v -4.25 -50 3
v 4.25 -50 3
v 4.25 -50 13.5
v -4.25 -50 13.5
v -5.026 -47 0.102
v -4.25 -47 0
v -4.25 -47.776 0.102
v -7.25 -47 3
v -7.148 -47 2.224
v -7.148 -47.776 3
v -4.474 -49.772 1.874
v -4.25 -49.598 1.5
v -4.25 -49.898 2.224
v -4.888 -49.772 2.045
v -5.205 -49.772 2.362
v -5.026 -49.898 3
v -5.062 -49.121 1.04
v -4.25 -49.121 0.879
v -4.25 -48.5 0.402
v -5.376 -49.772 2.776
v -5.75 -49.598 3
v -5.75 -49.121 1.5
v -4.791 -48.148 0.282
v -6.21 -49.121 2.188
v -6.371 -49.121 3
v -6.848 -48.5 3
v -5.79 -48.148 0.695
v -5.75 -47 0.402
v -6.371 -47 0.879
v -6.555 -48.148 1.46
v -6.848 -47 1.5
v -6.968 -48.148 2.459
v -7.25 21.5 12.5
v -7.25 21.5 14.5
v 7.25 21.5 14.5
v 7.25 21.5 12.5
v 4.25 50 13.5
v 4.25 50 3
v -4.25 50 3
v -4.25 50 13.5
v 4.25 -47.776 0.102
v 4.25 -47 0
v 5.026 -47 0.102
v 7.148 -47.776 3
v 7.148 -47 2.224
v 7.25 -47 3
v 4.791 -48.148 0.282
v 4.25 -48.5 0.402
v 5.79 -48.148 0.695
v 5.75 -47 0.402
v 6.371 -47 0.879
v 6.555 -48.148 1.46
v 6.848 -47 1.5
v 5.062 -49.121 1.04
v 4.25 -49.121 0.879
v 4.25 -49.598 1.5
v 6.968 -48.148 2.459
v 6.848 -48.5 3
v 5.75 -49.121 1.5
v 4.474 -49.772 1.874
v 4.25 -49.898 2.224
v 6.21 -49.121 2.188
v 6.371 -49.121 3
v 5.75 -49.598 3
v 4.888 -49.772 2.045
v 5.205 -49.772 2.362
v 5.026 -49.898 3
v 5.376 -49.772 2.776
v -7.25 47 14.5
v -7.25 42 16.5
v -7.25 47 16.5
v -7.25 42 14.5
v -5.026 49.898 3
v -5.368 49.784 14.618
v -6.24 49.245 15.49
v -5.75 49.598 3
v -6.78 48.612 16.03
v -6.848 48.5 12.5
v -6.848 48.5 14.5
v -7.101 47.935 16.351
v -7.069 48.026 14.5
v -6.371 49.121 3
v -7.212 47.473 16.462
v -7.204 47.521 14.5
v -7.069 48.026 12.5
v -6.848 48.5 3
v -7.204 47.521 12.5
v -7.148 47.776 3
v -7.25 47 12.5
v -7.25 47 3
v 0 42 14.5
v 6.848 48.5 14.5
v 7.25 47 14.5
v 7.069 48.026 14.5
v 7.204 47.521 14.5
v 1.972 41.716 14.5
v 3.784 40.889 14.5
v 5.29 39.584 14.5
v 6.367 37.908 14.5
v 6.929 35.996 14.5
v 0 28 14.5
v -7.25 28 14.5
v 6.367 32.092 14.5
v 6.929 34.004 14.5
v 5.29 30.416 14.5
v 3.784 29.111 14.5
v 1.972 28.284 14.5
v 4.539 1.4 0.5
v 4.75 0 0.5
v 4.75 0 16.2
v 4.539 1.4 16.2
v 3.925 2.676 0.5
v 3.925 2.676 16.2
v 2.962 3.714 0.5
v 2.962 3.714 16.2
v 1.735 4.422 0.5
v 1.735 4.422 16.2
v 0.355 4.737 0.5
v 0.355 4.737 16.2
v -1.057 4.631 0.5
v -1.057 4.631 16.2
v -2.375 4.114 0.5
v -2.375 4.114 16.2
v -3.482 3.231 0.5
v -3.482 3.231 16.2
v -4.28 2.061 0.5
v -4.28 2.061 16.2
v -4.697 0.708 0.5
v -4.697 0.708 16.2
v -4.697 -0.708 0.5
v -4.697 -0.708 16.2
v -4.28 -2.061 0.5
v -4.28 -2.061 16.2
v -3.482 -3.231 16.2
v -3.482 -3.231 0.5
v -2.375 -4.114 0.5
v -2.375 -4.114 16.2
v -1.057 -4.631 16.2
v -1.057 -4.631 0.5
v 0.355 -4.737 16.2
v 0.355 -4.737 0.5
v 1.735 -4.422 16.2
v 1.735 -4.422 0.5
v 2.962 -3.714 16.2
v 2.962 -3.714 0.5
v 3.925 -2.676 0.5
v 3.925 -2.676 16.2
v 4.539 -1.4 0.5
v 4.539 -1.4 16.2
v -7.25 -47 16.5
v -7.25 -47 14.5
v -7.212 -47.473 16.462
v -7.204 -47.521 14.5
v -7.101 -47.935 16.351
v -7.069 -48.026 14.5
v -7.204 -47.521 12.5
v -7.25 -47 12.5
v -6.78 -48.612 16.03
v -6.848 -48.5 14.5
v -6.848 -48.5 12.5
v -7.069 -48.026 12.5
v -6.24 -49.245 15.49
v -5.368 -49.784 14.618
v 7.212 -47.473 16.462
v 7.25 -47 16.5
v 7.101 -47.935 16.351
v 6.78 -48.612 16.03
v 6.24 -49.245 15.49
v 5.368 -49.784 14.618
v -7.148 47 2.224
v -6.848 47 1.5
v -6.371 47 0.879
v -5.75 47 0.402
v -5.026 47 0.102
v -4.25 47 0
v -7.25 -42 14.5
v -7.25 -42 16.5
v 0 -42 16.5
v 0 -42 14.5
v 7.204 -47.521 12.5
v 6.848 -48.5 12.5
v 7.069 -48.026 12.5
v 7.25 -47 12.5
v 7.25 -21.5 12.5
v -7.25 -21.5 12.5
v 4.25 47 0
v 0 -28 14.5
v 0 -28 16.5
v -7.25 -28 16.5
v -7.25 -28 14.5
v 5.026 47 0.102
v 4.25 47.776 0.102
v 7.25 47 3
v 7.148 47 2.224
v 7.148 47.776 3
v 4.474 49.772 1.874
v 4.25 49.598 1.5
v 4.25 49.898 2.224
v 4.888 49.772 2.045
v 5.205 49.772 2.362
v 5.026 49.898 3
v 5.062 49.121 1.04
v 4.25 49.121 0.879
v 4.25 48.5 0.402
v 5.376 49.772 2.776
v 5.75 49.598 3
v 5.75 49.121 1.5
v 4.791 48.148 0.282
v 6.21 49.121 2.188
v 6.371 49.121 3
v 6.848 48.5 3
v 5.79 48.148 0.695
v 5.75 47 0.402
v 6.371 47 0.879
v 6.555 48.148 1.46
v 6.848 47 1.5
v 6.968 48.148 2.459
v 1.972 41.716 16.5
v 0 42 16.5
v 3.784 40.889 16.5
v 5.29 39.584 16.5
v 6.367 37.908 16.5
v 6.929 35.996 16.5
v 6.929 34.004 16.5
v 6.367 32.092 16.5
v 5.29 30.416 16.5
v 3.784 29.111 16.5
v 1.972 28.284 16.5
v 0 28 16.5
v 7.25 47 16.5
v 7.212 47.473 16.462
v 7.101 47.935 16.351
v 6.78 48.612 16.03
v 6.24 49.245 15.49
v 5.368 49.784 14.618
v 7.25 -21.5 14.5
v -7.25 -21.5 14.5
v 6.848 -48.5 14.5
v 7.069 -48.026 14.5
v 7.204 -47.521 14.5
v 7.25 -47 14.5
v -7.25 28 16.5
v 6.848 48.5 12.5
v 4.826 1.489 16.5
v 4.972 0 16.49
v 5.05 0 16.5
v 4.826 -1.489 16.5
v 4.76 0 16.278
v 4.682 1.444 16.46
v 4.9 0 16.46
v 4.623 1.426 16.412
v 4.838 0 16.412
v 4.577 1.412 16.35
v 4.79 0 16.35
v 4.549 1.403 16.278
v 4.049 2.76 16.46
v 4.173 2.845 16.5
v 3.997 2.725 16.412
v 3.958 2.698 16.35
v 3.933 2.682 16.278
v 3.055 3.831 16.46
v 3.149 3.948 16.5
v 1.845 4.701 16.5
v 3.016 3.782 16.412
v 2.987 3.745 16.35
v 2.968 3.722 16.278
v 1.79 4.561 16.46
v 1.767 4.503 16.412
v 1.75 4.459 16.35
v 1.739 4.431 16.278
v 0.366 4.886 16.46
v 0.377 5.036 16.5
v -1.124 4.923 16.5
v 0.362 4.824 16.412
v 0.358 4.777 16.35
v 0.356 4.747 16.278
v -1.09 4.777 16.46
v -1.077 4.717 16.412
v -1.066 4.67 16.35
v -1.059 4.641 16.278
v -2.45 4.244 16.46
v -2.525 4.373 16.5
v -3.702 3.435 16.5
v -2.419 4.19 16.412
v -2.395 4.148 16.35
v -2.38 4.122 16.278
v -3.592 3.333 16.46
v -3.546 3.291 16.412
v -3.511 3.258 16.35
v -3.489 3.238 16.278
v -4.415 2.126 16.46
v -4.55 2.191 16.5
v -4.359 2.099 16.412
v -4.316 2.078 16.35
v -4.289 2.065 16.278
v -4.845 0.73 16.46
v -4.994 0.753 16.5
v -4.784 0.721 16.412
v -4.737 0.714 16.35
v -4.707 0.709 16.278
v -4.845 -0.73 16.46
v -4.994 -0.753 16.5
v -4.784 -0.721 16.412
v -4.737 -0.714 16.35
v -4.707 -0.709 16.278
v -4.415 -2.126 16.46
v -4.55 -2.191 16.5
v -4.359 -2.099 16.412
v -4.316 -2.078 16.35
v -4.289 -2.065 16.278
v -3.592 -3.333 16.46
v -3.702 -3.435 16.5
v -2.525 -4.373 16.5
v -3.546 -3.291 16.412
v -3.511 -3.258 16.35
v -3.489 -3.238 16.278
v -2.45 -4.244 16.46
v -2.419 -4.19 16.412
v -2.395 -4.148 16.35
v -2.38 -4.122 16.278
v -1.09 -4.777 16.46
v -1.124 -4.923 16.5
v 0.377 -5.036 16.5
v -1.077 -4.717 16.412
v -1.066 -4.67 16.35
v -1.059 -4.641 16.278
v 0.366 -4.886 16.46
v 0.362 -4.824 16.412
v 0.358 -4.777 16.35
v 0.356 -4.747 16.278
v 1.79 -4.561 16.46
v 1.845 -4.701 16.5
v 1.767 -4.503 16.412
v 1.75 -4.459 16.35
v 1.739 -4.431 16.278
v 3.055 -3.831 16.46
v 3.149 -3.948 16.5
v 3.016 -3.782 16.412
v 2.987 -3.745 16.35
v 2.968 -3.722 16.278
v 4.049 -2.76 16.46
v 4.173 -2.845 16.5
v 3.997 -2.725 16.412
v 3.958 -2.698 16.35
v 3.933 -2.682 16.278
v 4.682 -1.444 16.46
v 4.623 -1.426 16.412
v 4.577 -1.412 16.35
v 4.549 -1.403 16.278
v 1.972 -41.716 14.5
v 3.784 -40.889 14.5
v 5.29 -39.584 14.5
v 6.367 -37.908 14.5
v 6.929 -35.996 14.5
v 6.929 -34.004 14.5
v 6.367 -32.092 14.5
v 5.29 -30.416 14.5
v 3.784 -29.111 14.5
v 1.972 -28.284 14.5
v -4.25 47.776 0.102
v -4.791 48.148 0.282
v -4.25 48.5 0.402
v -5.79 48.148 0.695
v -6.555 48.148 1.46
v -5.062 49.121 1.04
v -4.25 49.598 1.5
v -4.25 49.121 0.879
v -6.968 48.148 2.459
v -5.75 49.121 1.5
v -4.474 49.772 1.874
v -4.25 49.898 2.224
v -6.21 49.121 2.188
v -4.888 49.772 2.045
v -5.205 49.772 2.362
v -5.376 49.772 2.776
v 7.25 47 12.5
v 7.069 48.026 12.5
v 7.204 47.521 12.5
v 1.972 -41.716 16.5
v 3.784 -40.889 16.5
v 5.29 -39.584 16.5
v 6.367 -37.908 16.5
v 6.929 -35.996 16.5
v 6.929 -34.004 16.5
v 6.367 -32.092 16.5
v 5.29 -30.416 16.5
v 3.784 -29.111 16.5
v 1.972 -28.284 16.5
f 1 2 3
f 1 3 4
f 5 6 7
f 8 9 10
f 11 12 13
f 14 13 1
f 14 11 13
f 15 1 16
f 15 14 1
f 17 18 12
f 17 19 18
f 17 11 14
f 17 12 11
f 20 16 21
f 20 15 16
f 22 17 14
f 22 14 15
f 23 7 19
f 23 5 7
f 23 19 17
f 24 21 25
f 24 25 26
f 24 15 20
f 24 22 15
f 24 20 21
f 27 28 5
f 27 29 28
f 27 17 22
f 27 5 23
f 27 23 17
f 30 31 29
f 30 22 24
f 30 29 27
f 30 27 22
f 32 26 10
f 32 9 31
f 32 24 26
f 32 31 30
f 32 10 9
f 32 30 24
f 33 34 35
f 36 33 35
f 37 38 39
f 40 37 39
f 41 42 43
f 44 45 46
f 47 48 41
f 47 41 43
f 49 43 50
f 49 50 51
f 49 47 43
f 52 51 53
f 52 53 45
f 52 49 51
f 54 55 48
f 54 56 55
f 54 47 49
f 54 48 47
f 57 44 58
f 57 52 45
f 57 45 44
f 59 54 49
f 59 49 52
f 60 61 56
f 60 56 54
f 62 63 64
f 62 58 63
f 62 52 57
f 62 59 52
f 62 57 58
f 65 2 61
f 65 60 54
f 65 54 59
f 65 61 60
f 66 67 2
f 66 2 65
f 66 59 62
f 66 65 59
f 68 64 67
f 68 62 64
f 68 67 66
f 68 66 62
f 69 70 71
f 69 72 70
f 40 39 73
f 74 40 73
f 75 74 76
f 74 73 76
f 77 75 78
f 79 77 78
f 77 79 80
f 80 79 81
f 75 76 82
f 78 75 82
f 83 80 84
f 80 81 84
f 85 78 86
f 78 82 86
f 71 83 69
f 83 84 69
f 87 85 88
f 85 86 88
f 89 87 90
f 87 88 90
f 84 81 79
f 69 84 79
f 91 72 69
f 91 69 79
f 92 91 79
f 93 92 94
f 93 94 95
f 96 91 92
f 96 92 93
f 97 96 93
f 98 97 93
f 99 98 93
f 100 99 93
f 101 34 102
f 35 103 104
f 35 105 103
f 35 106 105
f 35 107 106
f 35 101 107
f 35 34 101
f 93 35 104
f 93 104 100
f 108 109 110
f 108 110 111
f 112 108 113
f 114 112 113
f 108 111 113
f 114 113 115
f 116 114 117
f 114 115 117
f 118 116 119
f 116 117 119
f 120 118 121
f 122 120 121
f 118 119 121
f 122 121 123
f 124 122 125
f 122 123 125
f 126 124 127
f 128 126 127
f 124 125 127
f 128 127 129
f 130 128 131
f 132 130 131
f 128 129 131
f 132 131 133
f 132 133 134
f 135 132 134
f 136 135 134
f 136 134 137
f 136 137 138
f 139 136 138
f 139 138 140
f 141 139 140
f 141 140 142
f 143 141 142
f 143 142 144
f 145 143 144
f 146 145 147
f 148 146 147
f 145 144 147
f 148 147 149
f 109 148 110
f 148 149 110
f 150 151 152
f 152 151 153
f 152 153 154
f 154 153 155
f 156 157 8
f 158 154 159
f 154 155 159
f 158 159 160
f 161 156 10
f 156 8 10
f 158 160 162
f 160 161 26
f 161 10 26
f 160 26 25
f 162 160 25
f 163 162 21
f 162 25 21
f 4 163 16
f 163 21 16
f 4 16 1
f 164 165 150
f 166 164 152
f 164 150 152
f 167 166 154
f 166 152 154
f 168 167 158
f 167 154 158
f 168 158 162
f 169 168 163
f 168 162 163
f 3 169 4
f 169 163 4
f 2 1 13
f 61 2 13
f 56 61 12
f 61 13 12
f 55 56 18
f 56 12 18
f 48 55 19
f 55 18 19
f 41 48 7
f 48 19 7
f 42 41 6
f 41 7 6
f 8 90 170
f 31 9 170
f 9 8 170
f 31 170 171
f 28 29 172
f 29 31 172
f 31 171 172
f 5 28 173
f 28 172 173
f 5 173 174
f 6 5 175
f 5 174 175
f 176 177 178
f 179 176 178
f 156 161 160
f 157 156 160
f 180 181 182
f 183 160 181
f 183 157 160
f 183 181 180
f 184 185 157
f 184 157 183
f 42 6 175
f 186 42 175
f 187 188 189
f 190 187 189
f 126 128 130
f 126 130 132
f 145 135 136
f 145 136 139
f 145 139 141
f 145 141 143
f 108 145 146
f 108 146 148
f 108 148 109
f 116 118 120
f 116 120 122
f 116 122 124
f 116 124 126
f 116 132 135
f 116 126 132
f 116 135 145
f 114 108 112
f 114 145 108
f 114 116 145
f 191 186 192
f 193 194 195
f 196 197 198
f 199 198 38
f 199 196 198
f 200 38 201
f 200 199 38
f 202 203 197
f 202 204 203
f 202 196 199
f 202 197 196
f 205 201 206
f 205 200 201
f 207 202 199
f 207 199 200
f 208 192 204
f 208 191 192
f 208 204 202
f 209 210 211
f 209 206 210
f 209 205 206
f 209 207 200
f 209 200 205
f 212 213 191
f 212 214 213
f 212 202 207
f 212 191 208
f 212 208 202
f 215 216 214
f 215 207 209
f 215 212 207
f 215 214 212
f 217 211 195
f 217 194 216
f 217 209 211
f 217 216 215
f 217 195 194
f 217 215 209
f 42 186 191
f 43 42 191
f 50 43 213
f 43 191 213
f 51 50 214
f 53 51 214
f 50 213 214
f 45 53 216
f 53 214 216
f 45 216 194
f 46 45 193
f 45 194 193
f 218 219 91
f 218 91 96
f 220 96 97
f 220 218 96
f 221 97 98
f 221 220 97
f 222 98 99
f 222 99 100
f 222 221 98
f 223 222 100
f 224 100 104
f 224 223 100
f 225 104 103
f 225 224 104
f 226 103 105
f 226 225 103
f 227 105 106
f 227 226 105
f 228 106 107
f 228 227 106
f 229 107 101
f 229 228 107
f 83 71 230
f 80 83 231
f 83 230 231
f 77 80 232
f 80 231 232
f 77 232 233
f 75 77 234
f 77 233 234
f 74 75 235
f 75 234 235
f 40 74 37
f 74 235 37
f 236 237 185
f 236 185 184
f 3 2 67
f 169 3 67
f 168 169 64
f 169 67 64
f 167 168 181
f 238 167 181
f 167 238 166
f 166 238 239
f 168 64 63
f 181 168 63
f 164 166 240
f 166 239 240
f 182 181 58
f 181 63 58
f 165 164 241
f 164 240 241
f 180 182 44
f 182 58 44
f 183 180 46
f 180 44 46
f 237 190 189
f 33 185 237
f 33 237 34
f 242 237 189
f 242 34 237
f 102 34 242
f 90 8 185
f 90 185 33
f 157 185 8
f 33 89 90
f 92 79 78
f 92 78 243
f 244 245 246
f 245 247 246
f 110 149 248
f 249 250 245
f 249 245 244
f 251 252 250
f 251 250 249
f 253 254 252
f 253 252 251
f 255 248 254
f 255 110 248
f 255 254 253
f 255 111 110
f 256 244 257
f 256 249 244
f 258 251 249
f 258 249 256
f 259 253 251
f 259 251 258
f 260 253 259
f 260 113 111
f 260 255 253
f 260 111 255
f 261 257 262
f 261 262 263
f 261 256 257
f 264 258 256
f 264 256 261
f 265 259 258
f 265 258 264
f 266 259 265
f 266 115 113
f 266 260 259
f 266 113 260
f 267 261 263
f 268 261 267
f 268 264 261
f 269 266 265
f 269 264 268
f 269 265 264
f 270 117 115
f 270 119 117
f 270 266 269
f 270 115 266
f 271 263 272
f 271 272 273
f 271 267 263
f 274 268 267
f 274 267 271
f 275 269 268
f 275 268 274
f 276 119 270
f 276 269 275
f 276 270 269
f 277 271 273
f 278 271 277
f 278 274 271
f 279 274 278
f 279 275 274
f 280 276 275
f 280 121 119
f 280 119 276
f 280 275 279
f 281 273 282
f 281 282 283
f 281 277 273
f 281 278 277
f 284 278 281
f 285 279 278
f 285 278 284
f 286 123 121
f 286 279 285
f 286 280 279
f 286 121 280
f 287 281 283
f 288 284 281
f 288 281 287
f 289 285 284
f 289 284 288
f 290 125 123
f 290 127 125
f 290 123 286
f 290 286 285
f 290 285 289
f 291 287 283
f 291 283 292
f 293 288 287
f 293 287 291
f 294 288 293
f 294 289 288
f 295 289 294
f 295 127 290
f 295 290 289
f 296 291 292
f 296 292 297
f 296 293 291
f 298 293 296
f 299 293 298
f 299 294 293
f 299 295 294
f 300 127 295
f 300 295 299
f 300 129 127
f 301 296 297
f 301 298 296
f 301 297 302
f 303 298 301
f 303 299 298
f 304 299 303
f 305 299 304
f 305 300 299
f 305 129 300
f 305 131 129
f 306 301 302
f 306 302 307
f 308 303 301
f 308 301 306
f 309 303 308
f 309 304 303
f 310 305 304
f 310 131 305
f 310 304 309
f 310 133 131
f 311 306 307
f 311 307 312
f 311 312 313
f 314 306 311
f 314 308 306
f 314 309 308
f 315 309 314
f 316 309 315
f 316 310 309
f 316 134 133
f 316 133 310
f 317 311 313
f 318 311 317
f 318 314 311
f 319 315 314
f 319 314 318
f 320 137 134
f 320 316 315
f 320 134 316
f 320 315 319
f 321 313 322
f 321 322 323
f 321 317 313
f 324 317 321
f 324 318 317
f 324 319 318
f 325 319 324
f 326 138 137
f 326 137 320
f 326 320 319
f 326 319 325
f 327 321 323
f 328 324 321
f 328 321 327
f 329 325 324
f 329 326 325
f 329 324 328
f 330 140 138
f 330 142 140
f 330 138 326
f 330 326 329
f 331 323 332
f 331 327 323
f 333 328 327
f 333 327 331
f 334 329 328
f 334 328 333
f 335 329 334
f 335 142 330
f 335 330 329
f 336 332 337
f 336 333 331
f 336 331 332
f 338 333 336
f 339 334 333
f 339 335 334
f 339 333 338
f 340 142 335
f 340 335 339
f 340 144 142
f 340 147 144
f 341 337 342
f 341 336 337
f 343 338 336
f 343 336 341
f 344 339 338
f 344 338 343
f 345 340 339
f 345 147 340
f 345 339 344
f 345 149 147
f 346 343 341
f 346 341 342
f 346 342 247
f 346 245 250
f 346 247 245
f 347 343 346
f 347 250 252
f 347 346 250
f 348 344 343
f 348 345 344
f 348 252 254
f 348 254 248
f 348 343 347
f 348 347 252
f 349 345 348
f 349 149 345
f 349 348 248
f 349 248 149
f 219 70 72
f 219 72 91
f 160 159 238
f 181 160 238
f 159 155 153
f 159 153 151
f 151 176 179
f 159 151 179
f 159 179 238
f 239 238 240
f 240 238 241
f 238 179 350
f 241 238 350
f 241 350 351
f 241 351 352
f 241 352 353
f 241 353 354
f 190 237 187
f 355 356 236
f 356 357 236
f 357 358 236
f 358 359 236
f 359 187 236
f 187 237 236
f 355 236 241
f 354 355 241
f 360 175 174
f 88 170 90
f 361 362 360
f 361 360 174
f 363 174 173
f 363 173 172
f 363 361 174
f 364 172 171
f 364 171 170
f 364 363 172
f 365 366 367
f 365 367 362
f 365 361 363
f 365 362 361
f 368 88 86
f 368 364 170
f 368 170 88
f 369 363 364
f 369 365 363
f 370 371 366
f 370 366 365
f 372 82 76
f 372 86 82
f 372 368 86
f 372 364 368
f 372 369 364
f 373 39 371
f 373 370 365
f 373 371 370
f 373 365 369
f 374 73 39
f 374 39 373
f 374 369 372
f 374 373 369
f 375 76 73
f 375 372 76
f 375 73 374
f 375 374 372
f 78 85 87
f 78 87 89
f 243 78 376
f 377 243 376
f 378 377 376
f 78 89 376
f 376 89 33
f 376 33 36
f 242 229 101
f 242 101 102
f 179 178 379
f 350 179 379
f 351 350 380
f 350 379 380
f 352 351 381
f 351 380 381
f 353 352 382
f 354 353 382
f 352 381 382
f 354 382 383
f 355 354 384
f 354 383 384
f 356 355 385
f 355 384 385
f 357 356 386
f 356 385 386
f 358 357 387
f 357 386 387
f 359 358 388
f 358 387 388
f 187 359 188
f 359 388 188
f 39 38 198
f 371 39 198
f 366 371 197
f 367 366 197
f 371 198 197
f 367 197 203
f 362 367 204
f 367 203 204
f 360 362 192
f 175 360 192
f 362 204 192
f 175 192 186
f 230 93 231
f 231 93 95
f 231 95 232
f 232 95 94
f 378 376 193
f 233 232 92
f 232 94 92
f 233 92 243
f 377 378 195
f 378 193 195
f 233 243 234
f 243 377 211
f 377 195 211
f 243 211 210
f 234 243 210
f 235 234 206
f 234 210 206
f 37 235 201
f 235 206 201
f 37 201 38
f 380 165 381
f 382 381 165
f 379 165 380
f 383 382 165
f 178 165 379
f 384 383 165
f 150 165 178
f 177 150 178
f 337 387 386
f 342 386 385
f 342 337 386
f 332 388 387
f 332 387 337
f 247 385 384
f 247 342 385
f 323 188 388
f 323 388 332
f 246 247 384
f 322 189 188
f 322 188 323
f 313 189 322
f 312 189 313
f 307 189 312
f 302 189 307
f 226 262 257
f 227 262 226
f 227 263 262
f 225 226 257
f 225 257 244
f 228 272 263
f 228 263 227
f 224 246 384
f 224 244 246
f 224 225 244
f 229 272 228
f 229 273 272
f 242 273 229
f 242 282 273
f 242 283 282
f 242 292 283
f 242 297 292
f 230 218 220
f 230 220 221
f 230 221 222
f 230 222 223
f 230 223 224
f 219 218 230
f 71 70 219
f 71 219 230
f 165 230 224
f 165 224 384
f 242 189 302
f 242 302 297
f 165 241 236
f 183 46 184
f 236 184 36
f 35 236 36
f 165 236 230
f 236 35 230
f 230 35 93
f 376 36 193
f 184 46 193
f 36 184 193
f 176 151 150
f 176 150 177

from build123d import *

# Parameters (mm, degrees)
SKETCH7_W           = 100
SKETCH7_H           = 14.5
BOSS_EXTRUDE1_DEPTH = 16.5
SKETCH8_R           = 4.75
CUT_EXTRUDE2_DEPTH  = 16
CUT_EXTRUDE3_START  = -2
SKETCH9_W           = 27
SKETCH9_H           = 27
CUT_EXTRUDE3_DEPTH  = 2
CUT_EXTRUDE4_DEPTH  = 2
FILLET1_R           = 3
FILLET2_R           = 3
FILLET3_R           = 0.3
FILLET4_R           = 3


with BuildPart() as part:
    # Sketch7 → Boss-Extrude1 (new body)
    with BuildSketch(Plane(origin=(0, 0, 0), x_dir=(0, 1, 0), z_dir=(0, 0, 1))):
        Rectangle(SKETCH7_W, SKETCH7_H)
    extrude(amount=BOSS_EXTRUDE1_DEPTH)

    # Sketch8 → Cut-Extrude2 (cut)
    with BuildSketch(Plane(origin=(0, 0, 16.5), x_dir=(0, -1, 0), z_dir=(0, 0, 1))):
        with Locations(Location((0, 0, 0), (0, 0, 90))):
            Circle(SKETCH8_R)
    extrude(amount=-CUT_EXTRUDE2_DEPTH, mode=Mode.SUBTRACT)

    # Sketch9 → Cut-Extrude3 (cut)
    with BuildSketch(Plane.XY.offset(16.5).offset(CUT_EXTRUDE3_START)):
        with Locations((0, -35)):
            Rectangle(SKETCH9_W, SKETCH9_H)
    cut_extrude3 = extrude(amount=-CUT_EXTRUDE3_DEPTH, mode=Mode.SUBTRACT)

    # Sketch10 → Cut-Extrude4 (cut)
    with BuildSketch(Plane.XY.offset(16.5)):
        with BuildLine():
            Line((0, -28), (-7.25, -28))
            Line((-7.25, -28), (-7.25, -42))
            Line((-7.25, -42), (0, -42))
            ThreePointArc((0, -42), (7, -35), (0, -28))
        make_face()
    cut_extrude4 = extrude(amount=-CUT_EXTRUDE4_DEPTH, mode=Mode.SUBTRACT)

    # Mirror1: Cut-Extrude3 across plane
    add(cut_extrude3.mirror(Plane.ZX), mode=Mode.SUBTRACT)

    # Mirror2: Cut-Extrude4 across plane
    add(cut_extrude4.mirror(Plane.ZX), mode=Mode.SUBTRACT)

    # Fillet1
    fillet1_edges = [part.edges().sort_by_distance(p)[0] for p in [
        (-7.25, 0, 0),
    ]]
    fillet(fillet1_edges, radius=FILLET1_R)

    # Fillet2
    fillet2_edges = [part.edges().sort_by_distance(p)[0] for p in [
        (7.25, 0, 0),
    ]]
    fillet(fillet2_edges, radius=FILLET2_R)

    # Fillet3
    fillet3_edges = [part.edges().sort_by_distance(p)[0] for p in [
        (-4.75, 0, 16.5),
    ]]
    fillet(fillet3_edges, radius=FILLET3_R)

    # Fillet4
    # the kernel refuses this fillet: 3 mm, written as the material it takes off along each edge
    with BuildSketch(Plane(origin=(-4.25, -50, 3), x_dir=(0, 0, -1), z_dir=(1, 0, 0))) as fillet4_piece_1:
        with BuildLine():
            CenterArc((3 - FILLET4_R, FILLET4_R), FILLET4_R, 270, 90)
            Line((3, FILLET4_R), (3, 0))
            Line((3, 0), (3 - FILLET4_R, 0))
        make_face()
    revolve(axis=Axis((-4.25, -50, 3), (0, 1, 0)), revolution_arc=90, mode=Mode.SUBTRACT)
    with BuildSketch(Plane(origin=(-7.25, -50, 3), x_dir=(0, 1, 0), z_dir=(0, 0, 1))) as fillet4_piece_2:
        with BuildLine():
            CenterArc((FILLET4_R, -FILLET4_R), FILLET4_R, 90, 90)
            Line((0, -FILLET4_R), (0, 0))
            Line((0, 0), (FILLET4_R, 0))
        make_face()
    extrude(amount=21, mode=Mode.SUBTRACT)
    with BuildSketch(Plane(origin=(-14.75, -50, 16.5), x_dir=(0, 1, 0), z_dir=(1, 0, 0)), Plane(origin=(14.75, 50, 16.5), x_dir=(0, -1, 0), z_dir=(-1, 0, 0))) as fillet4_piece_3:
        with BuildLine():
            CenterArc((FILLET4_R, -FILLET4_R), FILLET4_R, 90, 90)
            Line((0, -FILLET4_R), (0, 0))
            Line((0, 0), (FILLET4_R, 0))
        make_face()
    extrude(amount=29.5, mode=Mode.SUBTRACT)
    with BuildSketch(Plane(origin=(7.25, -50, 3), x_dir=(0, 1, 0), z_dir=(0, 0, 1)), Plane(origin=(-7.25, 50, 3), x_dir=(0, -1, 0), z_dir=(0, 0, 1)), Plane(origin=(7.25, 50, 3), x_dir=(-1, 0, 0), z_dir=(0, 0, 1))) as fillet4_piece_4:
        with BuildLine():
            CenterArc((FILLET4_R, FILLET4_R), FILLET4_R, 180, 90)
            Line((0, FILLET4_R), (0, 0))
            Line((0, 0), (FILLET4_R, 0))
        make_face()
    extrude(amount=21, mode=Mode.SUBTRACT)
    with BuildSketch(Plane(origin=(4.25, -50, 3), x_dir=(0, 0, -1), z_dir=(-1, 0, 0))) as fillet4_piece_5:
        with BuildLine():
            CenterArc((3 - FILLET4_R, -FILLET4_R), FILLET4_R, 0, 90)
            Line((3, -FILLET4_R), (3, 0))
            Line((3, 0), (3 - FILLET4_R, 0))
        make_face()
    revolve(axis=Axis((4.25, -50, 3), (0, -1, 0)), revolution_arc=90, mode=Mode.SUBTRACT)
    with BuildSketch(Plane(origin=(-4.25, -50, 0), x_dir=(0, 0, 1), z_dir=(1, 0, 0)), Plane(origin=(4.25, 50, 0), x_dir=(0, 0, 1), z_dir=(-1, 0, 0))) as fillet4_piece_6:
        with BuildLine():
            CenterArc((FILLET4_R, -FILLET4_R), FILLET4_R, 90, 90)
            Line((0, -FILLET4_R), (0, 0))
            Line((0, 0), (FILLET4_R, 0))
        make_face()
    extrude(amount=8.5, mode=Mode.SUBTRACT)
    with BuildSketch(Plane(origin=(-4.25, 50, 3), x_dir=(0, 0, -1), z_dir=(1, 0, 0))) as fillet4_piece_7:
        with BuildLine():
            CenterArc((3 - FILLET4_R, -FILLET4_R), FILLET4_R, 0, 90)
            Line((3, -FILLET4_R), (3, 0))
            Line((3, 0), (3 - FILLET4_R, 0))
        make_face()
    revolve(axis=Axis((-4.25, 50, 3), (0, 1, 0)), revolution_arc=90, mode=Mode.SUBTRACT)
    with BuildSketch(Plane(origin=(4.25, 50, 3), x_dir=(0, 0, -1), z_dir=(-1, 0, 0))) as fillet4_piece_8:
        with BuildLine():
            CenterArc((3 - FILLET4_R, FILLET4_R), FILLET4_R, 270, 90)
            Line((3, FILLET4_R), (3, 0))
            Line((3, 0), (3 - FILLET4_R, 0))
        make_face()
    revolve(axis=Axis((4.25, 50, 3), (0, -1, 0)), revolution_arc=90, mode=Mode.SUBTRACT)


solid = part.part
